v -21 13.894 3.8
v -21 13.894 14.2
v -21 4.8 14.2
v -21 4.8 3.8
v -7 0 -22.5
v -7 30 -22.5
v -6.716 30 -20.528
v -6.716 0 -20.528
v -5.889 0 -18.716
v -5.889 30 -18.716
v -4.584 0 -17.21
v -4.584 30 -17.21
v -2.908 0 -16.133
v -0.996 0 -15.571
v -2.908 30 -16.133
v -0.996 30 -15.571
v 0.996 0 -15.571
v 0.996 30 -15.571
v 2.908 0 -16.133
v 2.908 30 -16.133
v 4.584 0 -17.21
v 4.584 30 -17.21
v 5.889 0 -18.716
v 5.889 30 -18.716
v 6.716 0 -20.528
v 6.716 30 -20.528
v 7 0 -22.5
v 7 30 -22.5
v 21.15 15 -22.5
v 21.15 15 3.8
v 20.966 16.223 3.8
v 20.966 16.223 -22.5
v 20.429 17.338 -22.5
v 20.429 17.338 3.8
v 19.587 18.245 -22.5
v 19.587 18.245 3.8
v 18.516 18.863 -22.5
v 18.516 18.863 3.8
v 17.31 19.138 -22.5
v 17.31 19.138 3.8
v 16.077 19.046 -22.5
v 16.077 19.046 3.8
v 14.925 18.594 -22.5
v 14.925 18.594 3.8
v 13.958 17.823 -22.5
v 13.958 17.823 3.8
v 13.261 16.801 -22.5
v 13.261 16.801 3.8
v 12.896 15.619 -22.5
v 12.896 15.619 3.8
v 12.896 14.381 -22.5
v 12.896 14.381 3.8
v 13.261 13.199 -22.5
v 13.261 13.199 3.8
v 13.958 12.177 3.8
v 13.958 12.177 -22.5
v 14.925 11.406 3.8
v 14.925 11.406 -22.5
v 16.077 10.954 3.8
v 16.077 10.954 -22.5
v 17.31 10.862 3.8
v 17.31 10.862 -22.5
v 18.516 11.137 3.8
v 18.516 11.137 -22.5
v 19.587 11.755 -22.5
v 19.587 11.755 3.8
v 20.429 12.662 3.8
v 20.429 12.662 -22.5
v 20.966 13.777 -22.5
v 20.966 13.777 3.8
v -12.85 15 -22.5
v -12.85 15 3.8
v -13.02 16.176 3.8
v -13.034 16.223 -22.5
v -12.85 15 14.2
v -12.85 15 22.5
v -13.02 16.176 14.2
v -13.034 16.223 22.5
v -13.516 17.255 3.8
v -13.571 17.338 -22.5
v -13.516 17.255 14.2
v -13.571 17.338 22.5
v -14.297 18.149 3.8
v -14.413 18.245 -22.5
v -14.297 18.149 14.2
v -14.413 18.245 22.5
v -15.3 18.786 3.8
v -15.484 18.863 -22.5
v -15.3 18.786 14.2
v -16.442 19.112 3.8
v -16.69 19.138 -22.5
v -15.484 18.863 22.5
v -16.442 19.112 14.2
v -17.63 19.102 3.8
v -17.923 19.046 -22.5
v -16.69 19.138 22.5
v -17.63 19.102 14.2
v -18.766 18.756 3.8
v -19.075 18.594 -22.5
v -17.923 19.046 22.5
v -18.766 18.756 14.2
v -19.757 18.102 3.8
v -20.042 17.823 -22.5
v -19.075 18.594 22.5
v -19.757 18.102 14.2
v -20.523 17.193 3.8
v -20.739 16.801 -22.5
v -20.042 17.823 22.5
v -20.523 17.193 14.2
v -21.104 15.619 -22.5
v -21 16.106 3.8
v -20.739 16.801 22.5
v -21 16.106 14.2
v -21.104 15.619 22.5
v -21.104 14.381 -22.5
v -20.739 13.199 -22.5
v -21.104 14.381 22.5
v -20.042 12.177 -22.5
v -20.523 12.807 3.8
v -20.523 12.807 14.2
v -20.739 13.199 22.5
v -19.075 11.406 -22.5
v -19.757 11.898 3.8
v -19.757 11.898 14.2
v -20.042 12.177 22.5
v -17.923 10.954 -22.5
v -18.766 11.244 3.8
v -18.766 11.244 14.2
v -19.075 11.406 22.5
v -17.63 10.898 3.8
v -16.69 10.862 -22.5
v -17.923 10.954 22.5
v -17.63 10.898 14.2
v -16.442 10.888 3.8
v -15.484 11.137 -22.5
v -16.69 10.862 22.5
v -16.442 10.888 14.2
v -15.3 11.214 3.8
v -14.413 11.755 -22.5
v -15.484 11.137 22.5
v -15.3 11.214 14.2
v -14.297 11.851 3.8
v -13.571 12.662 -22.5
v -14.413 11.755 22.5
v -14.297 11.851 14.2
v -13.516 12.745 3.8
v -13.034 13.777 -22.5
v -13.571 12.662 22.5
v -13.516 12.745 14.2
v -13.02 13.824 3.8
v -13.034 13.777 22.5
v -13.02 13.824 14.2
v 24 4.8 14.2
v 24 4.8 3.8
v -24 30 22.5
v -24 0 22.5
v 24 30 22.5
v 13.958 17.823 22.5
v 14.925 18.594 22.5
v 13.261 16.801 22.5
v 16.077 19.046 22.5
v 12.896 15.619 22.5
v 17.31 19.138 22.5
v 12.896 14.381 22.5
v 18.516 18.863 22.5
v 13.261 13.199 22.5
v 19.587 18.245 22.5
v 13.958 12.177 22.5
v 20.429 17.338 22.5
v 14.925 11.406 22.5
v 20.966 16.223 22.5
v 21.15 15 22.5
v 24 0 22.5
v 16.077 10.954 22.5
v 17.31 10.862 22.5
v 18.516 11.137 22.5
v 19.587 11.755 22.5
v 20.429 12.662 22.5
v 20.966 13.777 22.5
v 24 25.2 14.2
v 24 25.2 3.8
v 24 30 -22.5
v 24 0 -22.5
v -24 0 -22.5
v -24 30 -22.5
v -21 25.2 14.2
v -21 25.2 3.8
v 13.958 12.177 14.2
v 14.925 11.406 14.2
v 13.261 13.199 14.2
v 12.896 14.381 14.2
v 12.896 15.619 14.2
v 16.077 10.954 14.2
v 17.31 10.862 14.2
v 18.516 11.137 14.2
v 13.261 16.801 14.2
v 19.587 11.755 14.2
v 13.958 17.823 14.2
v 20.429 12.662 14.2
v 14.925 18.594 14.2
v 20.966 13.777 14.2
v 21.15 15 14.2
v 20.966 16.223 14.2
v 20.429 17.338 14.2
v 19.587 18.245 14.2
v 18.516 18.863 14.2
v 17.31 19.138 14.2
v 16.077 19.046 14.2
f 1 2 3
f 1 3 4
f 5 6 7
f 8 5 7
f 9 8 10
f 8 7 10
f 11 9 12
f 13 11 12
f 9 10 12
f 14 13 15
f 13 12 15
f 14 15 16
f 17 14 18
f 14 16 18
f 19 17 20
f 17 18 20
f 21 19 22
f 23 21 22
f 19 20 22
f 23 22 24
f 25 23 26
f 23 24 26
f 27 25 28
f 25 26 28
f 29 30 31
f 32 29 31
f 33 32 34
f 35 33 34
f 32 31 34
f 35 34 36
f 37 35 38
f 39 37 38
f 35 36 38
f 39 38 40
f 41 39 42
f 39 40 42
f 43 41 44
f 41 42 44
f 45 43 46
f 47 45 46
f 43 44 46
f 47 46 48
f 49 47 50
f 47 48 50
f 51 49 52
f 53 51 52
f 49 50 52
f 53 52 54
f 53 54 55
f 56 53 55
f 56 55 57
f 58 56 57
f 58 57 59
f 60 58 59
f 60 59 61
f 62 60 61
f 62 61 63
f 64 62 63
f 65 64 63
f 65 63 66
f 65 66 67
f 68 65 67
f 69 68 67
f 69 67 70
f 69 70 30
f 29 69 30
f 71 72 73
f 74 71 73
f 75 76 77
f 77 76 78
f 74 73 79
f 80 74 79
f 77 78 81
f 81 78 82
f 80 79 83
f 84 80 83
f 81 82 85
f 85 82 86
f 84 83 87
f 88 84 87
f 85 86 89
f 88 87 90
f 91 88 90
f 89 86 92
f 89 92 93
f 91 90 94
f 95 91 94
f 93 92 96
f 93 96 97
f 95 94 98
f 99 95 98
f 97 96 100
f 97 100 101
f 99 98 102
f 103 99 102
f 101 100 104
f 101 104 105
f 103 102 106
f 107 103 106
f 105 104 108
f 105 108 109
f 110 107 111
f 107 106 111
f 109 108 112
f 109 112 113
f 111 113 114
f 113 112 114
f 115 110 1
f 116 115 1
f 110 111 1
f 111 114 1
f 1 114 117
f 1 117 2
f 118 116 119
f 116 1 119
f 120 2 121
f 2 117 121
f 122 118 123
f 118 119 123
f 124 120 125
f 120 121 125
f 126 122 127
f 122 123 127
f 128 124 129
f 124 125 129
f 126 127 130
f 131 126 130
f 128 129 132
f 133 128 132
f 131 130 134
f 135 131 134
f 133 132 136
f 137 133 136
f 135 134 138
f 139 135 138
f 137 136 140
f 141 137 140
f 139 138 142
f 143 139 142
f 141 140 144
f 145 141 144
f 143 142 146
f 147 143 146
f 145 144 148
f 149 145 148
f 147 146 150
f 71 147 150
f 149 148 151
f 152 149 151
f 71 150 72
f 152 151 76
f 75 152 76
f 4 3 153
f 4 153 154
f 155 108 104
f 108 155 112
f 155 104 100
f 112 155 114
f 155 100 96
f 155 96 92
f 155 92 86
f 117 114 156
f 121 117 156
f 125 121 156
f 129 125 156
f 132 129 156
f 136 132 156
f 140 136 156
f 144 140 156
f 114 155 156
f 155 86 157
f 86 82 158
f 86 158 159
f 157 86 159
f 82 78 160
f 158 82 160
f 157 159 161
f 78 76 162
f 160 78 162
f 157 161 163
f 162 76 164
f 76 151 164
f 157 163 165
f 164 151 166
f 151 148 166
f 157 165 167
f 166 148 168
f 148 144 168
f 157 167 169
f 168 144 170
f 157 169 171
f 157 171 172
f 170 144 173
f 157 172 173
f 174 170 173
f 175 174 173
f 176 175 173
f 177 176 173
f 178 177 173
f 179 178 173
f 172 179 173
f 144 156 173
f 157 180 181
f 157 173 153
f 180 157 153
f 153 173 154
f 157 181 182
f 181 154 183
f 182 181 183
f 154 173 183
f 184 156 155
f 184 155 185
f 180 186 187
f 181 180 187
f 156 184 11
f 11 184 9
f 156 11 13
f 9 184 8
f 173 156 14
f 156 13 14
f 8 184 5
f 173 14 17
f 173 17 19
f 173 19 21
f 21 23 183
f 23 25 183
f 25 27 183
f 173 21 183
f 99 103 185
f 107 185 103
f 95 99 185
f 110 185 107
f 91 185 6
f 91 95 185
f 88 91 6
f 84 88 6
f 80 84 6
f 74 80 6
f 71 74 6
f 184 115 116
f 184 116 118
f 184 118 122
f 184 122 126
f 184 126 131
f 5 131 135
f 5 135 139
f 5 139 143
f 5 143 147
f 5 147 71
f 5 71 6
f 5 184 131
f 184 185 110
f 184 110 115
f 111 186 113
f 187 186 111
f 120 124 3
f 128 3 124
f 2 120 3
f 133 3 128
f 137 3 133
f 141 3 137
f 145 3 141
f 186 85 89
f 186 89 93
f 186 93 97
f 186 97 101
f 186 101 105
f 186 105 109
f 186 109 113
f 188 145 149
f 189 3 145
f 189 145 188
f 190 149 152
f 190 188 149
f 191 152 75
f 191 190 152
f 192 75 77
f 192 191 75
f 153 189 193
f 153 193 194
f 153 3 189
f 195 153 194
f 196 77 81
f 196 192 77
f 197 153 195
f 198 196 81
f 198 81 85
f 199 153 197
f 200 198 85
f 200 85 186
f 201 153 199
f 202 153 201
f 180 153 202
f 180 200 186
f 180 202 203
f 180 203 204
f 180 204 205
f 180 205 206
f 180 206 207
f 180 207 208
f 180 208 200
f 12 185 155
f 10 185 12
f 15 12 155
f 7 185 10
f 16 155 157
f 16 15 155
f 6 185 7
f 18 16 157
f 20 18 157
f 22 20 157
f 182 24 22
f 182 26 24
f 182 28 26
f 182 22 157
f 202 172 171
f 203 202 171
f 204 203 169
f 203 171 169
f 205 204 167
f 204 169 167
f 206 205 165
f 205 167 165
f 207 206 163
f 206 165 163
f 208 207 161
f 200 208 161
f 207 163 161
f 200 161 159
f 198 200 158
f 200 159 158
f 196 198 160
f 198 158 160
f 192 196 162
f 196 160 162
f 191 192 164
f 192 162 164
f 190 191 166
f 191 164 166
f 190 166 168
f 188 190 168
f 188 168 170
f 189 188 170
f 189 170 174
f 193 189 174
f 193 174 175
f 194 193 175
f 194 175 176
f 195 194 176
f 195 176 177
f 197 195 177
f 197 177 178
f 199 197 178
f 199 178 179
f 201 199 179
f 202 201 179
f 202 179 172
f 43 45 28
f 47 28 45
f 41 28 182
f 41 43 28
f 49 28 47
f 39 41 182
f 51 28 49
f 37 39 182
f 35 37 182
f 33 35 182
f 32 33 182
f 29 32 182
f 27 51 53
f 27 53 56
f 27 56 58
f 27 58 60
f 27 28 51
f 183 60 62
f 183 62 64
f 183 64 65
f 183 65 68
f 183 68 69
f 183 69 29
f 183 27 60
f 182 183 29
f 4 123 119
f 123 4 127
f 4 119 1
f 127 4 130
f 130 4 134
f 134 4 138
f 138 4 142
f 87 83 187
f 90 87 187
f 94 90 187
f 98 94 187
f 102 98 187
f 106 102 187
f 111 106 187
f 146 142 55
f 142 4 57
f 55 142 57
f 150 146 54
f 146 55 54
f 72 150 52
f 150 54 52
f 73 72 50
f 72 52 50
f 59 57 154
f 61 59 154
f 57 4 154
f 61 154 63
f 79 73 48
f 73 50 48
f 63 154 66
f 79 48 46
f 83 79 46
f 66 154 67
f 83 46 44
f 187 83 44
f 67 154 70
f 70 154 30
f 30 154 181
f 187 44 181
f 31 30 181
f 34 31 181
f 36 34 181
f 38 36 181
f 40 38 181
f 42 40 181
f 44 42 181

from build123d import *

# Parameters (mm, degrees)
SKETCH1_W               = 48
SKETCH1_H               = 45
BOSS_EXTRUDE1_DEPTH     = 30
SKETCH2_W               = 10.4
SKETCH2_H               = 20.4
CUT_EXTRUDE1_DEPTH      = 45
SKETCH3_R               = 4.15
CUT_EXTRUDE2_DEPTH      = 46
CUT_EXTRUDE3_DEPTH      = 1
CUT_EXTRUDE3_DEPTH_BACK = 31


with BuildPart() as part:
    # Sketch1 → Boss-Extrude1 (new body)
    with BuildSketch(Plane(origin=(0, 0, 0), x_dir=(1, 0, 0), z_dir=(0, 1, 0))):
        Rectangle(SKETCH1_W, SKETCH1_H)
    extrude(amount=BOSS_EXTRUDE1_DEPTH)

    # Sketch2 → Cut-Extrude1 (cut)
    with BuildSketch(Plane(origin=(24, 0, 0), x_dir=(0, 0, -1), z_dir=(1, 0, 0))):
        with Locations((-9, 15)):
            Rectangle(SKETCH2_W, SKETCH2_H)
    extrude(amount=-CUT_EXTRUDE1_DEPTH, mode=Mode.SUBTRACT)

    # Sketch3 → Cut-Extrude2 (cut, through all)
    with BuildSketch(Plane.XY.offset(22.5)):
        with Locations((-17, 15)):
            Circle(SKETCH3_R)
        with Locations((17, 15)):
            Circle(SKETCH3_R)
    extrude(amount=-CUT_EXTRUDE2_DEPTH, mode=Mode.SUBTRACT)

    # Sketch4 → Cut-Extrude3 (cut, two sides)
    with BuildSketch(Plane(origin=(0, 30, 0), x_dir=(1, 0, 0), z_dir=(0, 1, 0))) as cut_extrude3_sk:
        with BuildLine():
            Line((-7, 141.788608739), (-7, 22.5))
            ThreePointArc((-7, 22.5), (0, 15.5), (7, 22.5))
            Line((7, 22.5), (7, 141.788608739))
            Line((7, 141.788608739), (7, 380.365826216))
            Line((7, 380.365826216), (-7, 380.365826216))
            Line((-7, 380.365826216), (-7, 141.788608739))
        make_face()
    extrude(amount=CUT_EXTRUDE3_DEPTH, mode=Mode.SUBTRACT)
    extrude(cut_extrude3_sk.sketch, amount=-CUT_EXTRUDE3_DEPTH_BACK, mode=Mode.SUBTRACT)


solid = part.part
